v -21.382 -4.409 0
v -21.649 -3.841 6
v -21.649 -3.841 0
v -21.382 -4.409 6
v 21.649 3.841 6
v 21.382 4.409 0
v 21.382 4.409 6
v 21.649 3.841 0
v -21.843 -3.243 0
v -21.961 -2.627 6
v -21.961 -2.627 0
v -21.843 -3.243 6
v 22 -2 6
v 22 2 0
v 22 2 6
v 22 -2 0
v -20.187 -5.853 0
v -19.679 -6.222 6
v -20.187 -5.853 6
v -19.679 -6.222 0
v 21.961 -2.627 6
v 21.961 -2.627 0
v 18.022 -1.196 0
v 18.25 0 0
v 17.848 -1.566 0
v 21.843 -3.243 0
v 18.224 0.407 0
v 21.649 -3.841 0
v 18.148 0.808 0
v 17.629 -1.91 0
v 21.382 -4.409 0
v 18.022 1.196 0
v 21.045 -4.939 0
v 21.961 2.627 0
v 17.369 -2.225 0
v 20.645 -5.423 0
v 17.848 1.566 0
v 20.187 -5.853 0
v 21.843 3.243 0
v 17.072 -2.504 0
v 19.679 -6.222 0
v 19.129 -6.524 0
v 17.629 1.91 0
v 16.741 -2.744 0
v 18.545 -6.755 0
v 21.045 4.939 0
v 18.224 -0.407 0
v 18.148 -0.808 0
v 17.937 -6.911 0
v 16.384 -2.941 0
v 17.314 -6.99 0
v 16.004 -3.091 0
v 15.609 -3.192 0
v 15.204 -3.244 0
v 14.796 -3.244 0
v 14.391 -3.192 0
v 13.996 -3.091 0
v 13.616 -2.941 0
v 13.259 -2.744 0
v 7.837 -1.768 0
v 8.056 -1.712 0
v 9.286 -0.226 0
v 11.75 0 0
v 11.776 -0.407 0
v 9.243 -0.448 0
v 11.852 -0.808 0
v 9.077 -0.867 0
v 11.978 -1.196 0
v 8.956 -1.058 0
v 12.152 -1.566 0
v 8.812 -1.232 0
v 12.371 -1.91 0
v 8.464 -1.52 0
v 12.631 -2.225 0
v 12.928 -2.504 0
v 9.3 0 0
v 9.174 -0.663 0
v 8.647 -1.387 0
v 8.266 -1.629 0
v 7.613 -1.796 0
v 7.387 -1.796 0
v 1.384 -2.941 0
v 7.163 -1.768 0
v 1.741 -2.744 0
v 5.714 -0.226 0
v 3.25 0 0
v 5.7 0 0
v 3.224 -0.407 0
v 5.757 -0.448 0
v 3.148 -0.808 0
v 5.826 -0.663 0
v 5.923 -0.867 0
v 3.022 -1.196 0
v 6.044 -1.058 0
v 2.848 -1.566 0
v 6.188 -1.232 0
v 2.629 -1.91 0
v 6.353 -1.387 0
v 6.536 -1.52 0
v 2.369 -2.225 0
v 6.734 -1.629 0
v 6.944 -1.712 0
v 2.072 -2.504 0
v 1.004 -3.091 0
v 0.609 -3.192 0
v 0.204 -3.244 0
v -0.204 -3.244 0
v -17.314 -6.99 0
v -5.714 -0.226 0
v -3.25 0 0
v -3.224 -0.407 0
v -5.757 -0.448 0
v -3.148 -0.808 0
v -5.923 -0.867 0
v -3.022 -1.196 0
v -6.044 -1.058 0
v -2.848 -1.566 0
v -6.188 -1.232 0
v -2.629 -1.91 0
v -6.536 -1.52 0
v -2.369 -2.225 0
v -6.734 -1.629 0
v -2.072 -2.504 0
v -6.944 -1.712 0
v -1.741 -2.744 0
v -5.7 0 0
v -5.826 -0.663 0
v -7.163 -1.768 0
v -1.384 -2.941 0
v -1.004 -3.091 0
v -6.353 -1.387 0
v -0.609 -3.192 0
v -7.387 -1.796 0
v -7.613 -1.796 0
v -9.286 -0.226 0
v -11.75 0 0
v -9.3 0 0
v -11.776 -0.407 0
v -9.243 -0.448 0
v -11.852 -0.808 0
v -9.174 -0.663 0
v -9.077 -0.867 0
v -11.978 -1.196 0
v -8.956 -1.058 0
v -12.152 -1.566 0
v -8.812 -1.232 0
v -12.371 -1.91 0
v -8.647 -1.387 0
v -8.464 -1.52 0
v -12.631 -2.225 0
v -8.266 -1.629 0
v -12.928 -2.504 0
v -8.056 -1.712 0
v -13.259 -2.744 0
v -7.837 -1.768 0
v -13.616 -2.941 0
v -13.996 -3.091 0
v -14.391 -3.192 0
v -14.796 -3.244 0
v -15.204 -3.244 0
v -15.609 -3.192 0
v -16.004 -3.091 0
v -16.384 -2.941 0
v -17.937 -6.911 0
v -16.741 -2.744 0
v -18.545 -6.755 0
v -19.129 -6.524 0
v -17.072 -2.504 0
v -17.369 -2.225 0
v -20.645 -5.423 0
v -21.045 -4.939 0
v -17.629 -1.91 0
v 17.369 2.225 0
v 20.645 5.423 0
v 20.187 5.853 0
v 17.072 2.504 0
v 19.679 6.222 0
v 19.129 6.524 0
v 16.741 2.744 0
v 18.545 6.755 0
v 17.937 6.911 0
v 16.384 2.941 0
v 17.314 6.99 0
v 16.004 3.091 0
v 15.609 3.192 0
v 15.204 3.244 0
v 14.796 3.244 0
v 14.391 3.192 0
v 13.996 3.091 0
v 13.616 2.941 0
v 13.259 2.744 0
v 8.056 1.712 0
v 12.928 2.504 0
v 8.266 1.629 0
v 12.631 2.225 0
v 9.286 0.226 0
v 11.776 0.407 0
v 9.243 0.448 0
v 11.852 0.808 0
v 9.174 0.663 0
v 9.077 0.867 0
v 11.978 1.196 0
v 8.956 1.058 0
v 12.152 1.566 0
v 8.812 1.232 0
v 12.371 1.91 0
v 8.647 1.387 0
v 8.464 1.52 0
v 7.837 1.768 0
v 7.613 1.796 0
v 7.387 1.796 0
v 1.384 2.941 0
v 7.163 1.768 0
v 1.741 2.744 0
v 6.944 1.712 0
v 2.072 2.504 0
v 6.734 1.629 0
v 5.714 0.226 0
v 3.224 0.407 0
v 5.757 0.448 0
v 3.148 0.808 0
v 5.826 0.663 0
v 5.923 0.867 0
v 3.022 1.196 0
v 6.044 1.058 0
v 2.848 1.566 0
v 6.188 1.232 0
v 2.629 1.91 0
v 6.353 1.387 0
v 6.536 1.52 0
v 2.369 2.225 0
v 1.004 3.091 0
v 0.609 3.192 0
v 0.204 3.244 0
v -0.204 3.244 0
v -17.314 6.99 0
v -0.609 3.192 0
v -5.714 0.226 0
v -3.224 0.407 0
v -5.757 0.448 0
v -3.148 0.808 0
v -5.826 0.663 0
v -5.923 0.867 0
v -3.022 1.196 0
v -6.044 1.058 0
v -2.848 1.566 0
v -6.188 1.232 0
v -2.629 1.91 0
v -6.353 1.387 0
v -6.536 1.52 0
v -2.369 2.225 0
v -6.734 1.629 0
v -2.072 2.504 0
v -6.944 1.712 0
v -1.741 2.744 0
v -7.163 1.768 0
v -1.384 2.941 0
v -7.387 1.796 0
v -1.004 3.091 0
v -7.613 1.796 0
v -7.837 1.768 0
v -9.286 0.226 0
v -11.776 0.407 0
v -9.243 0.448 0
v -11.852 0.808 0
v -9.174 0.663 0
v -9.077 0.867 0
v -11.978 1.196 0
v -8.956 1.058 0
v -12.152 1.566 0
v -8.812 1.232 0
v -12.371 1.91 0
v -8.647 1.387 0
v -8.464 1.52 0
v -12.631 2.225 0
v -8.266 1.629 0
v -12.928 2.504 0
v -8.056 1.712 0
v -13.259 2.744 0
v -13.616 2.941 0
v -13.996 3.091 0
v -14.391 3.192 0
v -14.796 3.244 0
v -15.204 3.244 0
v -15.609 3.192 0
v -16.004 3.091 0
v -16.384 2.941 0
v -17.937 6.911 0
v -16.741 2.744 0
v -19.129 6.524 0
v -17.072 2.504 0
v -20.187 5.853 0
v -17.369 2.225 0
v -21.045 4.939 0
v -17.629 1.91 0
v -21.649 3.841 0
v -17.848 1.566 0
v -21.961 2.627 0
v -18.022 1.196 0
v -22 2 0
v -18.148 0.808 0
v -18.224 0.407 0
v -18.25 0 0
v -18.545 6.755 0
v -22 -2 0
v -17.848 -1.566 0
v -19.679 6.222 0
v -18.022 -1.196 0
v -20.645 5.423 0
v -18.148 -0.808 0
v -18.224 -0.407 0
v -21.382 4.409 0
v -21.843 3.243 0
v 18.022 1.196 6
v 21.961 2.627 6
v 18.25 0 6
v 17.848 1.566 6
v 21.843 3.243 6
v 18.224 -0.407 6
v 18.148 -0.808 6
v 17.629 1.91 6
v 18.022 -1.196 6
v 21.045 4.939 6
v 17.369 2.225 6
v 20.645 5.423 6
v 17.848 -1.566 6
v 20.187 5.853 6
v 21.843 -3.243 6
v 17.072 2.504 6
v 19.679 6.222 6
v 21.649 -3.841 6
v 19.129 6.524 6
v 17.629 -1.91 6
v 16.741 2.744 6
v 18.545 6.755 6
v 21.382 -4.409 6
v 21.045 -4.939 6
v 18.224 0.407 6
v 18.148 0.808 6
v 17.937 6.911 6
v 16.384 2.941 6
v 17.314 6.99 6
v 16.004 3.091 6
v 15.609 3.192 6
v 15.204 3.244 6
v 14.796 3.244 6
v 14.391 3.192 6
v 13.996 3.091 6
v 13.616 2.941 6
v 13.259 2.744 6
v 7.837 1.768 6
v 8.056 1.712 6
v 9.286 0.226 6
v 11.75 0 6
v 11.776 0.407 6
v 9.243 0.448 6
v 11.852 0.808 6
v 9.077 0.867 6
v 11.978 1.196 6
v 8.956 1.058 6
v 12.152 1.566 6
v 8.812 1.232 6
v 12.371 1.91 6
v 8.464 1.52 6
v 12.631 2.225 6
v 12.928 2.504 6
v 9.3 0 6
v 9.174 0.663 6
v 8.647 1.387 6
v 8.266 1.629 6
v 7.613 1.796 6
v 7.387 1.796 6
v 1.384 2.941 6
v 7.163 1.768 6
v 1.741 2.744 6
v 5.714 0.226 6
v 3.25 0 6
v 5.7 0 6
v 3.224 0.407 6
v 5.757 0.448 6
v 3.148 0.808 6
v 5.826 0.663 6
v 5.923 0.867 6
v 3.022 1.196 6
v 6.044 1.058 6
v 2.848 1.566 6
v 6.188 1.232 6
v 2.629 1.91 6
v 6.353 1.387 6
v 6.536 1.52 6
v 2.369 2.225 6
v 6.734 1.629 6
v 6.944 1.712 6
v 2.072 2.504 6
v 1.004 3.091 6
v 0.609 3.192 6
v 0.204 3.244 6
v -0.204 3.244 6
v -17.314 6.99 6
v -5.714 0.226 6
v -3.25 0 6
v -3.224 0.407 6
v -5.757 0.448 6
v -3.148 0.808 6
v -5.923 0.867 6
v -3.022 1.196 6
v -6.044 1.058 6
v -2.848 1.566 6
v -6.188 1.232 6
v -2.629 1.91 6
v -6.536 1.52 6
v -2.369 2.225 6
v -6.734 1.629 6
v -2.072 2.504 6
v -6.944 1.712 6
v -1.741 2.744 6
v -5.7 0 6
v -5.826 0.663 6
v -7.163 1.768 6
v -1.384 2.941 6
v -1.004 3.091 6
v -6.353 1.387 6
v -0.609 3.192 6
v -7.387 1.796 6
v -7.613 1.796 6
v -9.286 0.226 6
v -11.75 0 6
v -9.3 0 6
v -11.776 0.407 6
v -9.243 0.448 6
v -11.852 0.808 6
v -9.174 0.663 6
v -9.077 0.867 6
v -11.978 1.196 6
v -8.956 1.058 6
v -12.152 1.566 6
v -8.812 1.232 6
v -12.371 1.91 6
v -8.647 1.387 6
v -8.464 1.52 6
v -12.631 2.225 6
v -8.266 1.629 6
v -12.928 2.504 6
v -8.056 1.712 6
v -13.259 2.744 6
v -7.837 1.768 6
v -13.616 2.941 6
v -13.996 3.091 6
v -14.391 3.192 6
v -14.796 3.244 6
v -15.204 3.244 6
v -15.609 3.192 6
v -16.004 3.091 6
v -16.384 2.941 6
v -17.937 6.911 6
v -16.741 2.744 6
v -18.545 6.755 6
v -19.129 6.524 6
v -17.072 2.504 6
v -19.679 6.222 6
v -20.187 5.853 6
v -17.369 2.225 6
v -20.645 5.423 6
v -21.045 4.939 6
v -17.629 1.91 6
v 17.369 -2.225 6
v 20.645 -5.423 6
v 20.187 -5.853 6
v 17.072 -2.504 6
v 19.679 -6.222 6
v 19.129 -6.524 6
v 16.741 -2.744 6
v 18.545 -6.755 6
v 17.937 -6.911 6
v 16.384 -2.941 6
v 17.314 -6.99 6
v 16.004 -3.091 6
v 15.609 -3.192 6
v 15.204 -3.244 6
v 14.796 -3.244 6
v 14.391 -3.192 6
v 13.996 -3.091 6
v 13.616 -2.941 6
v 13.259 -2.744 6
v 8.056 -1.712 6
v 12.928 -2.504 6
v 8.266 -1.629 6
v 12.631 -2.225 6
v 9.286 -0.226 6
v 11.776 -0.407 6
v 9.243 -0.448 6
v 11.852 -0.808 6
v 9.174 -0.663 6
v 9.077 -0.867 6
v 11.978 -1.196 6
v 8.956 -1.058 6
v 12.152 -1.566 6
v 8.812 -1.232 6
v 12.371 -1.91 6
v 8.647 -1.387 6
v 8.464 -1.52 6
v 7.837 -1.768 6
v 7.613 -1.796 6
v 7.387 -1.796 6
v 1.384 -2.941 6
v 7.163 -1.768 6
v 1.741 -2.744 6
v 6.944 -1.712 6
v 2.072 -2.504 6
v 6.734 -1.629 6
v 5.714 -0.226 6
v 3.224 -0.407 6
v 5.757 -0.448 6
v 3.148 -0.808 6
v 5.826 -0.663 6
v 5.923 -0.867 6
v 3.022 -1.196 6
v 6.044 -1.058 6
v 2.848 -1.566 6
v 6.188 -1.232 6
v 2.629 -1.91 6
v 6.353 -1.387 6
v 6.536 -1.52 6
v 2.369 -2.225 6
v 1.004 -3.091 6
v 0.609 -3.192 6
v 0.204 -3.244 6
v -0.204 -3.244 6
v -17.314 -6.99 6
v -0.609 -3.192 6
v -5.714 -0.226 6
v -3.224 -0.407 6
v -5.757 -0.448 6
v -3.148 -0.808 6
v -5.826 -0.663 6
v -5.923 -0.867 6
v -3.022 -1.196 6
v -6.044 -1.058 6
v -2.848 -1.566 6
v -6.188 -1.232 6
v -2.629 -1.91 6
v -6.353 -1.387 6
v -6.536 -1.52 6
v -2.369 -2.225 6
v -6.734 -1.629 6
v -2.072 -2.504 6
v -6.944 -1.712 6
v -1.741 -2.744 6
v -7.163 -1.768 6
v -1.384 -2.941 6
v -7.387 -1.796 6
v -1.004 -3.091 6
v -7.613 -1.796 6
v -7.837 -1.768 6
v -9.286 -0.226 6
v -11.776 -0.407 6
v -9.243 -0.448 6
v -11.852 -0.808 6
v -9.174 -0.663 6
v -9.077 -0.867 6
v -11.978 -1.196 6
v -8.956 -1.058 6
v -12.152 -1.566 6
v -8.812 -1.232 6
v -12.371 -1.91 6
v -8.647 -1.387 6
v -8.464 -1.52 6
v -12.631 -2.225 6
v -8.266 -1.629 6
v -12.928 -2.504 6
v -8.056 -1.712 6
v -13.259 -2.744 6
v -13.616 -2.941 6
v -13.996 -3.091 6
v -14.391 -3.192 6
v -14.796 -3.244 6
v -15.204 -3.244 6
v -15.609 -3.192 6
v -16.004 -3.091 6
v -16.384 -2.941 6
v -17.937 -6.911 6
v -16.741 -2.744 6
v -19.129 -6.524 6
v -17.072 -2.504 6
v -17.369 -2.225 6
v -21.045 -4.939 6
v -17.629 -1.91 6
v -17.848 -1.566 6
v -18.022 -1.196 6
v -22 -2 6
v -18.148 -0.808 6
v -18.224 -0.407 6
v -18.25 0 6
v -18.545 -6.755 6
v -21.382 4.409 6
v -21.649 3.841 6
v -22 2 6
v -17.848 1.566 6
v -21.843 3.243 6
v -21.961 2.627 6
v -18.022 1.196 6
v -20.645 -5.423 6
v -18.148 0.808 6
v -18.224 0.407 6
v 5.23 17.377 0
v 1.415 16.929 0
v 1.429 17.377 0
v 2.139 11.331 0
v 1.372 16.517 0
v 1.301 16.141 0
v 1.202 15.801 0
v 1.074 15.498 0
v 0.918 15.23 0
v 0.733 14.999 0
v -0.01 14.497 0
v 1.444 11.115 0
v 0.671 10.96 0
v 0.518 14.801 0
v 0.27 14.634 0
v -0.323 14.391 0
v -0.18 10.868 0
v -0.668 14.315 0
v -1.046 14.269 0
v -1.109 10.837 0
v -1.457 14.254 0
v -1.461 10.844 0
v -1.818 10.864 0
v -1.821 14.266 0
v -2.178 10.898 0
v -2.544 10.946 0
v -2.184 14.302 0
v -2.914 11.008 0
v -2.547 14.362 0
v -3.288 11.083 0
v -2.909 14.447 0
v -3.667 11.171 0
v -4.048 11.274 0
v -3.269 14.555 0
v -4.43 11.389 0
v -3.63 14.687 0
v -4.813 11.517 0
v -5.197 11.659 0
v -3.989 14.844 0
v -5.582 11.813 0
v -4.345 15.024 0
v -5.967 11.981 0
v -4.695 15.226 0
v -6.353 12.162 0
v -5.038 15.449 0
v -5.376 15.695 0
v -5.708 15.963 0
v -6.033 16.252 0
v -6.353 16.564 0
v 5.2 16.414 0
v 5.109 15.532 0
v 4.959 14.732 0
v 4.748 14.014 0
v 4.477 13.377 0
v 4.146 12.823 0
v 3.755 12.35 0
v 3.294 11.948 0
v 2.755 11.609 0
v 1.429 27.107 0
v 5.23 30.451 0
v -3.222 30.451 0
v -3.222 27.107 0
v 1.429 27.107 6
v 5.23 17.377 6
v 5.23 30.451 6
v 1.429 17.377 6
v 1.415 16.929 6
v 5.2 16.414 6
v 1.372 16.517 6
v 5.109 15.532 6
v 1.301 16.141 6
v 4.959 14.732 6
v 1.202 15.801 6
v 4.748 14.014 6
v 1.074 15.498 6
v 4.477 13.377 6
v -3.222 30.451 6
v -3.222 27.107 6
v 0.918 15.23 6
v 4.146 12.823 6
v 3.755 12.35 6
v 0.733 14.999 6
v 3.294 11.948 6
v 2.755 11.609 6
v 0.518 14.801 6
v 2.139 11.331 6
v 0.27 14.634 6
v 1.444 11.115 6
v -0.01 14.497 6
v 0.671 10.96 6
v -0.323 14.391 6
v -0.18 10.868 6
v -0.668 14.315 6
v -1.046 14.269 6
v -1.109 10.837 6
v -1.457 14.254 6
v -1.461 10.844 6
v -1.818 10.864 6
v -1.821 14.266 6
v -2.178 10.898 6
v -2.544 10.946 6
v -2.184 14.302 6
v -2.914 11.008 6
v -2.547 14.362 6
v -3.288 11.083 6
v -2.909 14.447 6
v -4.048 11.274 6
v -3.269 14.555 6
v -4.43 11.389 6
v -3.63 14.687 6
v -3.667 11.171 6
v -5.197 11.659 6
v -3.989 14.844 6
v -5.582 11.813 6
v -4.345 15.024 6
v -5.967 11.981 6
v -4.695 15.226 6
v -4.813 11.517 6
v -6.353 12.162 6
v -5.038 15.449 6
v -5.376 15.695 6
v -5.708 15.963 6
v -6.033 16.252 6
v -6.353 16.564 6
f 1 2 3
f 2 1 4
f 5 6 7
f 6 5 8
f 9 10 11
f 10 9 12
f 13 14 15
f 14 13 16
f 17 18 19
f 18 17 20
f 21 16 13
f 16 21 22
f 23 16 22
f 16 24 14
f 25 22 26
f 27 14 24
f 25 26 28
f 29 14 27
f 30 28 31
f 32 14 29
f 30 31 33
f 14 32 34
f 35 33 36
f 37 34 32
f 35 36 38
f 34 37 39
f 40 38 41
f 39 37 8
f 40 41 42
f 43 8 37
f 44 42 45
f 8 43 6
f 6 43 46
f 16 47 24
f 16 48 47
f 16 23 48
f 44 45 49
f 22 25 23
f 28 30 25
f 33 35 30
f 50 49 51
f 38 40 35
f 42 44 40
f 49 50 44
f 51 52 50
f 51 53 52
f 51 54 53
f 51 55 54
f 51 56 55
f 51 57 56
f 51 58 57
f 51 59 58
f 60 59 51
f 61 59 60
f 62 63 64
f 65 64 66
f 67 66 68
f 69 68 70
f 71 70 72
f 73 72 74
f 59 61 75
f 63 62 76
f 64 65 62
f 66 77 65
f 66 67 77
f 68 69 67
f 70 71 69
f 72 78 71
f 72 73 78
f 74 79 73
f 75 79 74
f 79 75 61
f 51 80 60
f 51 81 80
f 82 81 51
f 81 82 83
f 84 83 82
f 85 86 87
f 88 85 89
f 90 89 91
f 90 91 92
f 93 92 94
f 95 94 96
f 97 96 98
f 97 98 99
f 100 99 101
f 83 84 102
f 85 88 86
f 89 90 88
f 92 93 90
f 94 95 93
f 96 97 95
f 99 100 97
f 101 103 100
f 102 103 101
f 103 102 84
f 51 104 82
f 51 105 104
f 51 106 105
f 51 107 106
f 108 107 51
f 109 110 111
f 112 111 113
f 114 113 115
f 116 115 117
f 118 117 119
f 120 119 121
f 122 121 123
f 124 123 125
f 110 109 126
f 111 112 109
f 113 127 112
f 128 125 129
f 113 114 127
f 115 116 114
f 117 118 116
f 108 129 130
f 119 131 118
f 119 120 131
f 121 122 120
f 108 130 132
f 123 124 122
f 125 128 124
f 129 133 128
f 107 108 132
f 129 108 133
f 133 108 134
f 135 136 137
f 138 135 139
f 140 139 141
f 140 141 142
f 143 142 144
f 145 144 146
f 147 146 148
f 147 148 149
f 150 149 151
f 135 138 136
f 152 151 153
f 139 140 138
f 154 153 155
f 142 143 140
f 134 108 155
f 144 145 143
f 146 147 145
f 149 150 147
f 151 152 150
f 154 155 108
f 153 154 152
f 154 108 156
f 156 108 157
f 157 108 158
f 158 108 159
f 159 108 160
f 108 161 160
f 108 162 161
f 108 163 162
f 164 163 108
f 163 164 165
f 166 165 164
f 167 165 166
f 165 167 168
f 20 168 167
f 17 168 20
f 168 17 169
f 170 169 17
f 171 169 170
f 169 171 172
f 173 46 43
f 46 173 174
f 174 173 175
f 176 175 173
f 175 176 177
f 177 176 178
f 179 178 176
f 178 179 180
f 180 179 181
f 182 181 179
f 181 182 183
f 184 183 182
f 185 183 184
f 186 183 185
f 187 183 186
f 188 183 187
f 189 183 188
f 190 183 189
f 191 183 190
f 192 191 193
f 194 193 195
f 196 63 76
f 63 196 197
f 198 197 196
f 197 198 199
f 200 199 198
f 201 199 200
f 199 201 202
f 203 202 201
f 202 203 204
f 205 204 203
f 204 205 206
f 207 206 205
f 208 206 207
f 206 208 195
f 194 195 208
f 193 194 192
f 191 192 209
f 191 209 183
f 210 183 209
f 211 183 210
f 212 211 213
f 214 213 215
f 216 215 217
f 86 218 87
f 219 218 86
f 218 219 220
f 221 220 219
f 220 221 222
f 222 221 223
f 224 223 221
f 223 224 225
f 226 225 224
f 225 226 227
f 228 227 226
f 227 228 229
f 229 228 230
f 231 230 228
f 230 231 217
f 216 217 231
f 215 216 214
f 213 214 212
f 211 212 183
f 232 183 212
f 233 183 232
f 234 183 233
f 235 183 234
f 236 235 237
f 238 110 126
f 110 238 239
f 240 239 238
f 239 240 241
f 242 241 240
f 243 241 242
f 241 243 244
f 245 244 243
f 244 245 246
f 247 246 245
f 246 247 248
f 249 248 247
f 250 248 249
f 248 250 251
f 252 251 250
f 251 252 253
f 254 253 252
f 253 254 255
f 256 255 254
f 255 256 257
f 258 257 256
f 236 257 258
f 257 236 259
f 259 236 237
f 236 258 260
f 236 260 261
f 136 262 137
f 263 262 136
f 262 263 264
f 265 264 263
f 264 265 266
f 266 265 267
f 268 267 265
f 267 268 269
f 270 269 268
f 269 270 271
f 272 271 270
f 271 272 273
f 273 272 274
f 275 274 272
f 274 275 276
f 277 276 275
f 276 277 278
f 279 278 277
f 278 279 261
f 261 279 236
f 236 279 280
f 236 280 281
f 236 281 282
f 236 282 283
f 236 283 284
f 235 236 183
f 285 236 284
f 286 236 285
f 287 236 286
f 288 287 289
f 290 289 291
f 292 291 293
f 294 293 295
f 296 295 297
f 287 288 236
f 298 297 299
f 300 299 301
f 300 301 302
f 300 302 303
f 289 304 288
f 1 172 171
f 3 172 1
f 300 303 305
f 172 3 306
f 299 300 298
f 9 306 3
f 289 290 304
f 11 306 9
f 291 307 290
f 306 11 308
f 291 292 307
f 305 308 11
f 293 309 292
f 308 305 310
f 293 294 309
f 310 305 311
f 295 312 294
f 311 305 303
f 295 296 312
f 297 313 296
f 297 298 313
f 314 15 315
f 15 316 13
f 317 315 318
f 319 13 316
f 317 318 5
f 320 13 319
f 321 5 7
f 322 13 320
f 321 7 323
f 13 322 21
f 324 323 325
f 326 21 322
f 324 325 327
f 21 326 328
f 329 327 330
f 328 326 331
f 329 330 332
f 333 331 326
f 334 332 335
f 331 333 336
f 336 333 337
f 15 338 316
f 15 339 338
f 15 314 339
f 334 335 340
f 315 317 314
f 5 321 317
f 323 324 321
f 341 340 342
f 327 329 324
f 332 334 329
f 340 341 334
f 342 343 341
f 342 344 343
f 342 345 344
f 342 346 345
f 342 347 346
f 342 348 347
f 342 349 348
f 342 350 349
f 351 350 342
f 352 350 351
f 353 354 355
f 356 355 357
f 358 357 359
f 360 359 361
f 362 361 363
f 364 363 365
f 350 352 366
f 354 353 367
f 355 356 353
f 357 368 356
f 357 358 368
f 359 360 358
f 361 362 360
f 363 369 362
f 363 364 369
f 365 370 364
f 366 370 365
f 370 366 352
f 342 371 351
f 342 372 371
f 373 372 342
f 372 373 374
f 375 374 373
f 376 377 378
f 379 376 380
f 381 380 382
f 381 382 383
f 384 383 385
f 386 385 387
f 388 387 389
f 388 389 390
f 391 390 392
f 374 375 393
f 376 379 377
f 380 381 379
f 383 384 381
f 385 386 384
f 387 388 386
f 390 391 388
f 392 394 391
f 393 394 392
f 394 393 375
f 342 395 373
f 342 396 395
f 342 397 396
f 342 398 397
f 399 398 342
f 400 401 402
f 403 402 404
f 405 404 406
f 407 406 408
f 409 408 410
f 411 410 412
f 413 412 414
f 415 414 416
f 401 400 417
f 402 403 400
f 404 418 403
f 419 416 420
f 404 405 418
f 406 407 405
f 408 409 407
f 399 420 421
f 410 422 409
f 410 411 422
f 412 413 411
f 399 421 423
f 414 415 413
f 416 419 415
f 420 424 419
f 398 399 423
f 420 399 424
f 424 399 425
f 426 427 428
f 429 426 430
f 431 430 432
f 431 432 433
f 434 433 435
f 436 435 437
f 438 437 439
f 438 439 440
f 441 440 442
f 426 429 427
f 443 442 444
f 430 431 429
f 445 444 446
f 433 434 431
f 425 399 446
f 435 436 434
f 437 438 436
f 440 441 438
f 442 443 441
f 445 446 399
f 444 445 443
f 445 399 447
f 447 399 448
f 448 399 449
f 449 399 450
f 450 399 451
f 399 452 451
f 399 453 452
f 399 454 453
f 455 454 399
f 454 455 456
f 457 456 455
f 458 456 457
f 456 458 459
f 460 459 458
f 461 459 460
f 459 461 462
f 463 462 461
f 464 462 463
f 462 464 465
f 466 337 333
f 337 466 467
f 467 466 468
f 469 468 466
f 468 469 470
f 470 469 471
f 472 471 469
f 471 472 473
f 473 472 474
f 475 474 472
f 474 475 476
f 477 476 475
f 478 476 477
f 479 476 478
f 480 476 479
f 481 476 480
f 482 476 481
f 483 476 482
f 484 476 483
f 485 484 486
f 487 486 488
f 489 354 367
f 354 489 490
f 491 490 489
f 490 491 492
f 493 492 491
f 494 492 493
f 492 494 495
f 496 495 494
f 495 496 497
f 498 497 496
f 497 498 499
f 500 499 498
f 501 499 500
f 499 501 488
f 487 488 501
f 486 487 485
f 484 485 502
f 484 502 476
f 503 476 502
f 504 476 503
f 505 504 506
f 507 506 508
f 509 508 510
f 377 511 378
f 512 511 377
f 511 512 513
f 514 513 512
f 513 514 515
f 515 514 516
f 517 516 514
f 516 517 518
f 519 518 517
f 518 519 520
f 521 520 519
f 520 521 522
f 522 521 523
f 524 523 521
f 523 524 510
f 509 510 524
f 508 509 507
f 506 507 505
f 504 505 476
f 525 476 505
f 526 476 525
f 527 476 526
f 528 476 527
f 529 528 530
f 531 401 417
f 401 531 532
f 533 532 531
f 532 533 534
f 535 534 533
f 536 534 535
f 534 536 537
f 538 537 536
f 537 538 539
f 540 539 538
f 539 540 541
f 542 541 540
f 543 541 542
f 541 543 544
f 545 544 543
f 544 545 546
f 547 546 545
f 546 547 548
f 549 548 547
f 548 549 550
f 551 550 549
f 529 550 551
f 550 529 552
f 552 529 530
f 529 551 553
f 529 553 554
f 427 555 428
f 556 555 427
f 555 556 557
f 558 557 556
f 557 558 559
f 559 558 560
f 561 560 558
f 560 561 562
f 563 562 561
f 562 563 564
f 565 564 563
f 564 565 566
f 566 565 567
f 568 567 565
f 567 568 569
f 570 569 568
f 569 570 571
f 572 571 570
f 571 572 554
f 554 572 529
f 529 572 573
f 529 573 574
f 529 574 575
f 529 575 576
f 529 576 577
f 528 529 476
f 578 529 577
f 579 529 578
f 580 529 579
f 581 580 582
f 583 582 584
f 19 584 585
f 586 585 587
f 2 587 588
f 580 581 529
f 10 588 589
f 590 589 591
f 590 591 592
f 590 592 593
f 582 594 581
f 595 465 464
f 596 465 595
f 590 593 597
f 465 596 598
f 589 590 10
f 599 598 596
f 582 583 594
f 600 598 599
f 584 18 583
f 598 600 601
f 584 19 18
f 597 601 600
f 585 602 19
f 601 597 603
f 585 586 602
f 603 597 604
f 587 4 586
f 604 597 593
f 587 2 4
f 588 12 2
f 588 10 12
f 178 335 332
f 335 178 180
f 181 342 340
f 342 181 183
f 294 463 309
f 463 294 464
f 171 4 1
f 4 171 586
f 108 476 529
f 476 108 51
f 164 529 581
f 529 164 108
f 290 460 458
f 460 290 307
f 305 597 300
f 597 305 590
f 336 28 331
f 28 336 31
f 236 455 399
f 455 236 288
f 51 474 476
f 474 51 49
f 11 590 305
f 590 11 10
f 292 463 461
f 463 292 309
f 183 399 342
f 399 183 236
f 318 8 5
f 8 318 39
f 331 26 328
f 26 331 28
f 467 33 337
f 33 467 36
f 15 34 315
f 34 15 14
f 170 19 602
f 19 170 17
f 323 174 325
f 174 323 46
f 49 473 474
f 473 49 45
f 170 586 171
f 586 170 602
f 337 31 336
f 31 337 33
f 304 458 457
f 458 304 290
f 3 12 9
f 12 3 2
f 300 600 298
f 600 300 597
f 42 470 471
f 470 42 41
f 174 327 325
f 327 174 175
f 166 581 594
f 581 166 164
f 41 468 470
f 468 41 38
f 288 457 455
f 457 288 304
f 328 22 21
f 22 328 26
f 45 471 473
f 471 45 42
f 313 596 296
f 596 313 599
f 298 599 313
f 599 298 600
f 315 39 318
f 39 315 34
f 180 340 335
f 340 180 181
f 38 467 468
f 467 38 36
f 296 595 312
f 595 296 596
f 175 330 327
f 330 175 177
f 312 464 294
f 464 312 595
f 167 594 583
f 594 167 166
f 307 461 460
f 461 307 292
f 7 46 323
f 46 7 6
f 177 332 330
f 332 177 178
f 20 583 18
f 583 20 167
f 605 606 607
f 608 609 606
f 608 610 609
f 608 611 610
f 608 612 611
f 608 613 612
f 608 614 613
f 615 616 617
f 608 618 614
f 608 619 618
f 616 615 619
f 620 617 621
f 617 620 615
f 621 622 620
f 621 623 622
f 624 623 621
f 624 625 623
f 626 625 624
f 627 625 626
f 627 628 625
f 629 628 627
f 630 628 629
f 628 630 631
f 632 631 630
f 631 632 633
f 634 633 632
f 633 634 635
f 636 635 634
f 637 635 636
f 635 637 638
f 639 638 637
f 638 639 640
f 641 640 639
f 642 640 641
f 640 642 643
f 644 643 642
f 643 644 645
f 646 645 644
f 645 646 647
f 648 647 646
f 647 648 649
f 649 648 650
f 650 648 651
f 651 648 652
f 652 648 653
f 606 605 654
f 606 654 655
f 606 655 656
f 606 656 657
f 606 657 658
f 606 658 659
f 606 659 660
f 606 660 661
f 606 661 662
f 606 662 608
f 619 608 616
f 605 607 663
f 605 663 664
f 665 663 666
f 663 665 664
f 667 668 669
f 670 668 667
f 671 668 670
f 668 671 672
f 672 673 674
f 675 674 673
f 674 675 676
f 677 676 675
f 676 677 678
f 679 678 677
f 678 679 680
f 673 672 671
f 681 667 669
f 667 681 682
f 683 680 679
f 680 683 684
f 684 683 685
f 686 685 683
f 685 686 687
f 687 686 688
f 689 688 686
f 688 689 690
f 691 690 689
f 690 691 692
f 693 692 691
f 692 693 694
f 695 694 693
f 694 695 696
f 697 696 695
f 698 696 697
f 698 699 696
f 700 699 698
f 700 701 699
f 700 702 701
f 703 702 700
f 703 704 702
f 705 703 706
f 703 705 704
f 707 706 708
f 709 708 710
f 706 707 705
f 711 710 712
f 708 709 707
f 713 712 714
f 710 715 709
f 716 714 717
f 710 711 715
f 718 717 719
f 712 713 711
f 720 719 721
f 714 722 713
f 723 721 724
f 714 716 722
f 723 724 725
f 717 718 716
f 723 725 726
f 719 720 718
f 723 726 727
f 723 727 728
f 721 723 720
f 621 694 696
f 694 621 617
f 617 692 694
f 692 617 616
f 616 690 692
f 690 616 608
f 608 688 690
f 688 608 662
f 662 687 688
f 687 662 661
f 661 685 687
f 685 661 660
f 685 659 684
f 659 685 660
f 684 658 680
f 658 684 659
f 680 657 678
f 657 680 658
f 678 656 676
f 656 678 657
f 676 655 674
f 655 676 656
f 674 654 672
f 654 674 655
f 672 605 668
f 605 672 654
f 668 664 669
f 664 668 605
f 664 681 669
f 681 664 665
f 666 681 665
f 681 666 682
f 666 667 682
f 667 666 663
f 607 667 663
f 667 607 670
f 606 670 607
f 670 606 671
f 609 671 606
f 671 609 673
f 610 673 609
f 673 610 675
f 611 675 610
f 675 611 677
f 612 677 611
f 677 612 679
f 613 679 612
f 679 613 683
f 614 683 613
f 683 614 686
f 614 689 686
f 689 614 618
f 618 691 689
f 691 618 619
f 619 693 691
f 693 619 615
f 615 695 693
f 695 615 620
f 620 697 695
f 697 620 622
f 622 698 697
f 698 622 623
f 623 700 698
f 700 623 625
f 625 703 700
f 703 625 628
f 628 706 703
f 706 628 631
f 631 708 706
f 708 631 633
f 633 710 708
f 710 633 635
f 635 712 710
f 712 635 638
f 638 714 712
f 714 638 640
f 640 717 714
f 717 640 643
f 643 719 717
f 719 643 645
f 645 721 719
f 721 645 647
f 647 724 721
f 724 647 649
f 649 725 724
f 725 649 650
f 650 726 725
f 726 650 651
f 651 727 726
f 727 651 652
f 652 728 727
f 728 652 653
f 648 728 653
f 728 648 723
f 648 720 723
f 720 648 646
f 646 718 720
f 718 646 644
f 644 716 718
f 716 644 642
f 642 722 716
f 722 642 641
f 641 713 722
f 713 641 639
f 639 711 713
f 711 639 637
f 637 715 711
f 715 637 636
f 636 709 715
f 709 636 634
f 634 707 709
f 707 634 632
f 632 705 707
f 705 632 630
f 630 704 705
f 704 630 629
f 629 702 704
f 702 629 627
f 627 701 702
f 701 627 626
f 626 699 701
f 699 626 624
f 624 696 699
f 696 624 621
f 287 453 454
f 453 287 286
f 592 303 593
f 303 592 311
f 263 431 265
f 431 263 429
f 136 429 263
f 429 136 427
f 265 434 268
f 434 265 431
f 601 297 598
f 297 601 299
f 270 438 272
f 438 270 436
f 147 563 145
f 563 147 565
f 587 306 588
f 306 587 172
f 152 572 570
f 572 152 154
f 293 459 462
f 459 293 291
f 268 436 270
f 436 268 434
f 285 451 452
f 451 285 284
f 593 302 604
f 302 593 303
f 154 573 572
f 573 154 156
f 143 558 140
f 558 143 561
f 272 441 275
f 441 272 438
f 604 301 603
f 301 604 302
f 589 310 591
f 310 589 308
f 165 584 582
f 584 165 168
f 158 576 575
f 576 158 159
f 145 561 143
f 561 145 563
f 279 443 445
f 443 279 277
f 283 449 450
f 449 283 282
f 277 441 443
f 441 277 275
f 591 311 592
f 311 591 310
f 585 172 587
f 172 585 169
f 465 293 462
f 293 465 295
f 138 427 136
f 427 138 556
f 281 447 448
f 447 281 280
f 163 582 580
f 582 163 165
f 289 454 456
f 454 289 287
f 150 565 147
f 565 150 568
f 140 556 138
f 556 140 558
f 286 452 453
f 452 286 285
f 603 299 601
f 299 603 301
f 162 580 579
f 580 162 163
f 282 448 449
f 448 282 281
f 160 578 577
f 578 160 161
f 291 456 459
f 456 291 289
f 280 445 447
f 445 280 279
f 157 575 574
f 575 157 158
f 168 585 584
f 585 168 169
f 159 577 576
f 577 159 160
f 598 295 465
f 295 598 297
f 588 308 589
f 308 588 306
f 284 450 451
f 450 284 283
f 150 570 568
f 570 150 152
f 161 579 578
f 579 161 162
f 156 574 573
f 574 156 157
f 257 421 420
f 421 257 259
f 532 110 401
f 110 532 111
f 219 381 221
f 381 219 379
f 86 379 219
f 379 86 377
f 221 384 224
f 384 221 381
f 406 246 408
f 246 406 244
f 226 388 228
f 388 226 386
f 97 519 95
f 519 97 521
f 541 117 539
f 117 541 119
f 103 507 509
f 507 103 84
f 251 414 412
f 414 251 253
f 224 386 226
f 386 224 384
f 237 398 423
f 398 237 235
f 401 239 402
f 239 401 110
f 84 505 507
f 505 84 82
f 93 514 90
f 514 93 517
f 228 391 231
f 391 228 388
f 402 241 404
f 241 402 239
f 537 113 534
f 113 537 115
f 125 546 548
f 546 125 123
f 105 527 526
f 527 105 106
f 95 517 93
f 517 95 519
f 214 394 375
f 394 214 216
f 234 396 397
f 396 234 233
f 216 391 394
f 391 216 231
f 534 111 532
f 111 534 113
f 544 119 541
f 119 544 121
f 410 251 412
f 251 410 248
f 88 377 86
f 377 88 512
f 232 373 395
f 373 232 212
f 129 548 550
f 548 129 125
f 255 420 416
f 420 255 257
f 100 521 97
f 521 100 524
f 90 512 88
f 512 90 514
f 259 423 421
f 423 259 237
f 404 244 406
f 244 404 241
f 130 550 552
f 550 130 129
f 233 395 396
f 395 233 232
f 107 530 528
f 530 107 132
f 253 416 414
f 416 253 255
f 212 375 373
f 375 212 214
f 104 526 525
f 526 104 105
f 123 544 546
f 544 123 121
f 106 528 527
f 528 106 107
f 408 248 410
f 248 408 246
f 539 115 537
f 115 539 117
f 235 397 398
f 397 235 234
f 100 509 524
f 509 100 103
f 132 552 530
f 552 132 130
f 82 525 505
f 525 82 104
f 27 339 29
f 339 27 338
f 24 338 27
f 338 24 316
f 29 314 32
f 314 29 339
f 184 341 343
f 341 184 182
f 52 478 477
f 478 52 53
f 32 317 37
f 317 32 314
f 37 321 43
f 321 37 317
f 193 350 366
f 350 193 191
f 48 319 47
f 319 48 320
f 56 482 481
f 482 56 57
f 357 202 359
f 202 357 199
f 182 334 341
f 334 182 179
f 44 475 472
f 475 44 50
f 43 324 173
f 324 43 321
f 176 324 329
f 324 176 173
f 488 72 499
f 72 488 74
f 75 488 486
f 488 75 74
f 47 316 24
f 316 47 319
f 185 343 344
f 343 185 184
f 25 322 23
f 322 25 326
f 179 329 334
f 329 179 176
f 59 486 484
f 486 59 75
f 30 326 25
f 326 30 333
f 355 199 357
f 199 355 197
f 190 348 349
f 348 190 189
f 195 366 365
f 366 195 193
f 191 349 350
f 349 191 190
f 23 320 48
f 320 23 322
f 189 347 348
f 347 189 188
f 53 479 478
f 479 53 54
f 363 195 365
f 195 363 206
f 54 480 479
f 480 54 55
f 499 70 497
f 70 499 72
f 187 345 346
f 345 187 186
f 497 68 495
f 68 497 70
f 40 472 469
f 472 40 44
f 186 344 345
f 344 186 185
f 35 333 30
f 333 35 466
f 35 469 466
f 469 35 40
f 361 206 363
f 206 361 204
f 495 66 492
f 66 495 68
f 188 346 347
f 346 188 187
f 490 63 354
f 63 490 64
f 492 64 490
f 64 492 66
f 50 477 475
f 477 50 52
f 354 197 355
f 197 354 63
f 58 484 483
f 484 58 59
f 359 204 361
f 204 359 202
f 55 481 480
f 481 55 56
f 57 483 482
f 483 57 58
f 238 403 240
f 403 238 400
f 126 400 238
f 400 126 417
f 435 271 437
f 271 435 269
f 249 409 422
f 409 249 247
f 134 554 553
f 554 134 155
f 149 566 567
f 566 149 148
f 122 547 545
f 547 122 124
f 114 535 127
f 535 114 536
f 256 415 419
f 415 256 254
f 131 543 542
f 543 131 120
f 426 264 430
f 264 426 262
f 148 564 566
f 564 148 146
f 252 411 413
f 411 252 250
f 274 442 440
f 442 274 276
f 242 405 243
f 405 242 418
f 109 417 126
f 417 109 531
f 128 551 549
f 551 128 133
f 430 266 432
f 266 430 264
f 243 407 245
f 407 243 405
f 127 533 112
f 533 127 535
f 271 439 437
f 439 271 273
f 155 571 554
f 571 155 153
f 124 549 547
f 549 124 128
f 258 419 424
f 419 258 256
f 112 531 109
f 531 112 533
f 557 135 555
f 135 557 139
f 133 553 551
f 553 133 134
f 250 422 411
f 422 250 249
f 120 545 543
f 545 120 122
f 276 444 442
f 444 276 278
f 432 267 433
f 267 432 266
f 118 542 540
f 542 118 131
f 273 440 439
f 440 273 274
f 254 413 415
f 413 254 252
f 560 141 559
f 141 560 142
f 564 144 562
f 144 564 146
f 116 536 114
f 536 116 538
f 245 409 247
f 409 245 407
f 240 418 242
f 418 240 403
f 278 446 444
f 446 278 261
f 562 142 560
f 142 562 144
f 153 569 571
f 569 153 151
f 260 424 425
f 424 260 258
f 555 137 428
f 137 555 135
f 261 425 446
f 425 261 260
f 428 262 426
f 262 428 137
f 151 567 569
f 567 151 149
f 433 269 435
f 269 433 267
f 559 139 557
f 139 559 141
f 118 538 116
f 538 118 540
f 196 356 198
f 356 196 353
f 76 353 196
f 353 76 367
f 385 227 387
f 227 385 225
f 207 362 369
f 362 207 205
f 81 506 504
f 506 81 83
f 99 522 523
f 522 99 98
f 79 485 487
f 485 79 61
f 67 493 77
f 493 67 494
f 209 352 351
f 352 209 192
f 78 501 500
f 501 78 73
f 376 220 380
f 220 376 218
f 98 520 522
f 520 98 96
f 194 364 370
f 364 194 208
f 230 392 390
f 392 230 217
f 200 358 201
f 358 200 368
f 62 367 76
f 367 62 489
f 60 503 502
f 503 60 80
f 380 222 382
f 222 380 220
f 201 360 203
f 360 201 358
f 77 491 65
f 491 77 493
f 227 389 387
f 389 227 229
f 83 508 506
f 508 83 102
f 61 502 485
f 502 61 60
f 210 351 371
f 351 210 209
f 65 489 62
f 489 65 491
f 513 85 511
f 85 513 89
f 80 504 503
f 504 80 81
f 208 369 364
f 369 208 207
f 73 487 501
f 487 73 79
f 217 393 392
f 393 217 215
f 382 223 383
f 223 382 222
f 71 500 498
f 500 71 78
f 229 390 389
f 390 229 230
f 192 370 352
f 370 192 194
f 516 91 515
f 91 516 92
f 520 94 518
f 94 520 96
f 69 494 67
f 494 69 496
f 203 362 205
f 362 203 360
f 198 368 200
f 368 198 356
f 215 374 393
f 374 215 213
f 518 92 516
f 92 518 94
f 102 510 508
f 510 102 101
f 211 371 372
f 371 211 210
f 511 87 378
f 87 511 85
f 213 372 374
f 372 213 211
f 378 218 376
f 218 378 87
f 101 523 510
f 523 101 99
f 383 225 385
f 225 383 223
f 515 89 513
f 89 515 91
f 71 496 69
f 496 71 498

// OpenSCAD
$fn = 50;


difference() {
	union() {
		hull() {
			translate(v = [-17.0000000000, 2.0000000000, 0]) {
				cylinder(h = 6, r = 5);
			}
			translate(v = [17.0000000000, 2.0000000000, 0]) {
				cylinder(h = 6, r = 5);
			}
			translate(v = [-17.0000000000, -2.0000000000, 0]) {
				cylinder(h = 6, r = 5);
			}
			translate(v = [17.0000000000, -2.0000000000, 0]) {
				cylinder(h = 6, r = 5);
			}
		}
		translate(v = [0, 30.0000000000, 0]) {
			linear_extrude(height = 6) {
				text(font = "DejaVu Sans Mono:style=Bold", halign = "center", size = 19.0000000000, text = "J", valign = "top");
			}
		}
	}
	union() {
		translate(v = [-15.0000000000, 0.0000000000, 0]) {
			translate(v = [0, 0, -100]) {
				cylinder(h = 200, r = 3.2500000000);
			}
		}
		translate(v = [0, 0, -100]) {
			cylinder(h = 200, r = 3.2500000000);
		}
		translate(v = [15.0000000000, 0.0000000000, 0]) {
			translate(v = [0, 0, -100]) {
				cylinder(h = 200, r = 3.2500000000);
			}
		}
		translate(v = [-15.0000000000, 0.0000000000, 0]) {
			translate(v = [0, 0, -100]) {
				cylinder(h = 200, r = 1.8000000000);
			}
		}
		translate(v = [-7.5000000000, 0.0000000000, 0]) {
			translate(v = [0, 0, -100]) {
				cylinder(h = 200, r = 1.8000000000);
			}
		}
		translate(v = [0, 0, -100]) {
			cylinder(h = 200, r = 1.8000000000);
		}
		translate(v = [7.5000000000, 0.0000000000, 0]) {
			translate(v = [0, 0, -100]) {
				cylinder(h = 200, r = 1.8000000000);
			}
		}
		translate(v = [15.0000000000, 0.0000000000, 0]) {
			translate(v = [0, 0, -100]) {
				cylinder(h = 200, r = 1.8000000000);
			}
		}
	}
}
